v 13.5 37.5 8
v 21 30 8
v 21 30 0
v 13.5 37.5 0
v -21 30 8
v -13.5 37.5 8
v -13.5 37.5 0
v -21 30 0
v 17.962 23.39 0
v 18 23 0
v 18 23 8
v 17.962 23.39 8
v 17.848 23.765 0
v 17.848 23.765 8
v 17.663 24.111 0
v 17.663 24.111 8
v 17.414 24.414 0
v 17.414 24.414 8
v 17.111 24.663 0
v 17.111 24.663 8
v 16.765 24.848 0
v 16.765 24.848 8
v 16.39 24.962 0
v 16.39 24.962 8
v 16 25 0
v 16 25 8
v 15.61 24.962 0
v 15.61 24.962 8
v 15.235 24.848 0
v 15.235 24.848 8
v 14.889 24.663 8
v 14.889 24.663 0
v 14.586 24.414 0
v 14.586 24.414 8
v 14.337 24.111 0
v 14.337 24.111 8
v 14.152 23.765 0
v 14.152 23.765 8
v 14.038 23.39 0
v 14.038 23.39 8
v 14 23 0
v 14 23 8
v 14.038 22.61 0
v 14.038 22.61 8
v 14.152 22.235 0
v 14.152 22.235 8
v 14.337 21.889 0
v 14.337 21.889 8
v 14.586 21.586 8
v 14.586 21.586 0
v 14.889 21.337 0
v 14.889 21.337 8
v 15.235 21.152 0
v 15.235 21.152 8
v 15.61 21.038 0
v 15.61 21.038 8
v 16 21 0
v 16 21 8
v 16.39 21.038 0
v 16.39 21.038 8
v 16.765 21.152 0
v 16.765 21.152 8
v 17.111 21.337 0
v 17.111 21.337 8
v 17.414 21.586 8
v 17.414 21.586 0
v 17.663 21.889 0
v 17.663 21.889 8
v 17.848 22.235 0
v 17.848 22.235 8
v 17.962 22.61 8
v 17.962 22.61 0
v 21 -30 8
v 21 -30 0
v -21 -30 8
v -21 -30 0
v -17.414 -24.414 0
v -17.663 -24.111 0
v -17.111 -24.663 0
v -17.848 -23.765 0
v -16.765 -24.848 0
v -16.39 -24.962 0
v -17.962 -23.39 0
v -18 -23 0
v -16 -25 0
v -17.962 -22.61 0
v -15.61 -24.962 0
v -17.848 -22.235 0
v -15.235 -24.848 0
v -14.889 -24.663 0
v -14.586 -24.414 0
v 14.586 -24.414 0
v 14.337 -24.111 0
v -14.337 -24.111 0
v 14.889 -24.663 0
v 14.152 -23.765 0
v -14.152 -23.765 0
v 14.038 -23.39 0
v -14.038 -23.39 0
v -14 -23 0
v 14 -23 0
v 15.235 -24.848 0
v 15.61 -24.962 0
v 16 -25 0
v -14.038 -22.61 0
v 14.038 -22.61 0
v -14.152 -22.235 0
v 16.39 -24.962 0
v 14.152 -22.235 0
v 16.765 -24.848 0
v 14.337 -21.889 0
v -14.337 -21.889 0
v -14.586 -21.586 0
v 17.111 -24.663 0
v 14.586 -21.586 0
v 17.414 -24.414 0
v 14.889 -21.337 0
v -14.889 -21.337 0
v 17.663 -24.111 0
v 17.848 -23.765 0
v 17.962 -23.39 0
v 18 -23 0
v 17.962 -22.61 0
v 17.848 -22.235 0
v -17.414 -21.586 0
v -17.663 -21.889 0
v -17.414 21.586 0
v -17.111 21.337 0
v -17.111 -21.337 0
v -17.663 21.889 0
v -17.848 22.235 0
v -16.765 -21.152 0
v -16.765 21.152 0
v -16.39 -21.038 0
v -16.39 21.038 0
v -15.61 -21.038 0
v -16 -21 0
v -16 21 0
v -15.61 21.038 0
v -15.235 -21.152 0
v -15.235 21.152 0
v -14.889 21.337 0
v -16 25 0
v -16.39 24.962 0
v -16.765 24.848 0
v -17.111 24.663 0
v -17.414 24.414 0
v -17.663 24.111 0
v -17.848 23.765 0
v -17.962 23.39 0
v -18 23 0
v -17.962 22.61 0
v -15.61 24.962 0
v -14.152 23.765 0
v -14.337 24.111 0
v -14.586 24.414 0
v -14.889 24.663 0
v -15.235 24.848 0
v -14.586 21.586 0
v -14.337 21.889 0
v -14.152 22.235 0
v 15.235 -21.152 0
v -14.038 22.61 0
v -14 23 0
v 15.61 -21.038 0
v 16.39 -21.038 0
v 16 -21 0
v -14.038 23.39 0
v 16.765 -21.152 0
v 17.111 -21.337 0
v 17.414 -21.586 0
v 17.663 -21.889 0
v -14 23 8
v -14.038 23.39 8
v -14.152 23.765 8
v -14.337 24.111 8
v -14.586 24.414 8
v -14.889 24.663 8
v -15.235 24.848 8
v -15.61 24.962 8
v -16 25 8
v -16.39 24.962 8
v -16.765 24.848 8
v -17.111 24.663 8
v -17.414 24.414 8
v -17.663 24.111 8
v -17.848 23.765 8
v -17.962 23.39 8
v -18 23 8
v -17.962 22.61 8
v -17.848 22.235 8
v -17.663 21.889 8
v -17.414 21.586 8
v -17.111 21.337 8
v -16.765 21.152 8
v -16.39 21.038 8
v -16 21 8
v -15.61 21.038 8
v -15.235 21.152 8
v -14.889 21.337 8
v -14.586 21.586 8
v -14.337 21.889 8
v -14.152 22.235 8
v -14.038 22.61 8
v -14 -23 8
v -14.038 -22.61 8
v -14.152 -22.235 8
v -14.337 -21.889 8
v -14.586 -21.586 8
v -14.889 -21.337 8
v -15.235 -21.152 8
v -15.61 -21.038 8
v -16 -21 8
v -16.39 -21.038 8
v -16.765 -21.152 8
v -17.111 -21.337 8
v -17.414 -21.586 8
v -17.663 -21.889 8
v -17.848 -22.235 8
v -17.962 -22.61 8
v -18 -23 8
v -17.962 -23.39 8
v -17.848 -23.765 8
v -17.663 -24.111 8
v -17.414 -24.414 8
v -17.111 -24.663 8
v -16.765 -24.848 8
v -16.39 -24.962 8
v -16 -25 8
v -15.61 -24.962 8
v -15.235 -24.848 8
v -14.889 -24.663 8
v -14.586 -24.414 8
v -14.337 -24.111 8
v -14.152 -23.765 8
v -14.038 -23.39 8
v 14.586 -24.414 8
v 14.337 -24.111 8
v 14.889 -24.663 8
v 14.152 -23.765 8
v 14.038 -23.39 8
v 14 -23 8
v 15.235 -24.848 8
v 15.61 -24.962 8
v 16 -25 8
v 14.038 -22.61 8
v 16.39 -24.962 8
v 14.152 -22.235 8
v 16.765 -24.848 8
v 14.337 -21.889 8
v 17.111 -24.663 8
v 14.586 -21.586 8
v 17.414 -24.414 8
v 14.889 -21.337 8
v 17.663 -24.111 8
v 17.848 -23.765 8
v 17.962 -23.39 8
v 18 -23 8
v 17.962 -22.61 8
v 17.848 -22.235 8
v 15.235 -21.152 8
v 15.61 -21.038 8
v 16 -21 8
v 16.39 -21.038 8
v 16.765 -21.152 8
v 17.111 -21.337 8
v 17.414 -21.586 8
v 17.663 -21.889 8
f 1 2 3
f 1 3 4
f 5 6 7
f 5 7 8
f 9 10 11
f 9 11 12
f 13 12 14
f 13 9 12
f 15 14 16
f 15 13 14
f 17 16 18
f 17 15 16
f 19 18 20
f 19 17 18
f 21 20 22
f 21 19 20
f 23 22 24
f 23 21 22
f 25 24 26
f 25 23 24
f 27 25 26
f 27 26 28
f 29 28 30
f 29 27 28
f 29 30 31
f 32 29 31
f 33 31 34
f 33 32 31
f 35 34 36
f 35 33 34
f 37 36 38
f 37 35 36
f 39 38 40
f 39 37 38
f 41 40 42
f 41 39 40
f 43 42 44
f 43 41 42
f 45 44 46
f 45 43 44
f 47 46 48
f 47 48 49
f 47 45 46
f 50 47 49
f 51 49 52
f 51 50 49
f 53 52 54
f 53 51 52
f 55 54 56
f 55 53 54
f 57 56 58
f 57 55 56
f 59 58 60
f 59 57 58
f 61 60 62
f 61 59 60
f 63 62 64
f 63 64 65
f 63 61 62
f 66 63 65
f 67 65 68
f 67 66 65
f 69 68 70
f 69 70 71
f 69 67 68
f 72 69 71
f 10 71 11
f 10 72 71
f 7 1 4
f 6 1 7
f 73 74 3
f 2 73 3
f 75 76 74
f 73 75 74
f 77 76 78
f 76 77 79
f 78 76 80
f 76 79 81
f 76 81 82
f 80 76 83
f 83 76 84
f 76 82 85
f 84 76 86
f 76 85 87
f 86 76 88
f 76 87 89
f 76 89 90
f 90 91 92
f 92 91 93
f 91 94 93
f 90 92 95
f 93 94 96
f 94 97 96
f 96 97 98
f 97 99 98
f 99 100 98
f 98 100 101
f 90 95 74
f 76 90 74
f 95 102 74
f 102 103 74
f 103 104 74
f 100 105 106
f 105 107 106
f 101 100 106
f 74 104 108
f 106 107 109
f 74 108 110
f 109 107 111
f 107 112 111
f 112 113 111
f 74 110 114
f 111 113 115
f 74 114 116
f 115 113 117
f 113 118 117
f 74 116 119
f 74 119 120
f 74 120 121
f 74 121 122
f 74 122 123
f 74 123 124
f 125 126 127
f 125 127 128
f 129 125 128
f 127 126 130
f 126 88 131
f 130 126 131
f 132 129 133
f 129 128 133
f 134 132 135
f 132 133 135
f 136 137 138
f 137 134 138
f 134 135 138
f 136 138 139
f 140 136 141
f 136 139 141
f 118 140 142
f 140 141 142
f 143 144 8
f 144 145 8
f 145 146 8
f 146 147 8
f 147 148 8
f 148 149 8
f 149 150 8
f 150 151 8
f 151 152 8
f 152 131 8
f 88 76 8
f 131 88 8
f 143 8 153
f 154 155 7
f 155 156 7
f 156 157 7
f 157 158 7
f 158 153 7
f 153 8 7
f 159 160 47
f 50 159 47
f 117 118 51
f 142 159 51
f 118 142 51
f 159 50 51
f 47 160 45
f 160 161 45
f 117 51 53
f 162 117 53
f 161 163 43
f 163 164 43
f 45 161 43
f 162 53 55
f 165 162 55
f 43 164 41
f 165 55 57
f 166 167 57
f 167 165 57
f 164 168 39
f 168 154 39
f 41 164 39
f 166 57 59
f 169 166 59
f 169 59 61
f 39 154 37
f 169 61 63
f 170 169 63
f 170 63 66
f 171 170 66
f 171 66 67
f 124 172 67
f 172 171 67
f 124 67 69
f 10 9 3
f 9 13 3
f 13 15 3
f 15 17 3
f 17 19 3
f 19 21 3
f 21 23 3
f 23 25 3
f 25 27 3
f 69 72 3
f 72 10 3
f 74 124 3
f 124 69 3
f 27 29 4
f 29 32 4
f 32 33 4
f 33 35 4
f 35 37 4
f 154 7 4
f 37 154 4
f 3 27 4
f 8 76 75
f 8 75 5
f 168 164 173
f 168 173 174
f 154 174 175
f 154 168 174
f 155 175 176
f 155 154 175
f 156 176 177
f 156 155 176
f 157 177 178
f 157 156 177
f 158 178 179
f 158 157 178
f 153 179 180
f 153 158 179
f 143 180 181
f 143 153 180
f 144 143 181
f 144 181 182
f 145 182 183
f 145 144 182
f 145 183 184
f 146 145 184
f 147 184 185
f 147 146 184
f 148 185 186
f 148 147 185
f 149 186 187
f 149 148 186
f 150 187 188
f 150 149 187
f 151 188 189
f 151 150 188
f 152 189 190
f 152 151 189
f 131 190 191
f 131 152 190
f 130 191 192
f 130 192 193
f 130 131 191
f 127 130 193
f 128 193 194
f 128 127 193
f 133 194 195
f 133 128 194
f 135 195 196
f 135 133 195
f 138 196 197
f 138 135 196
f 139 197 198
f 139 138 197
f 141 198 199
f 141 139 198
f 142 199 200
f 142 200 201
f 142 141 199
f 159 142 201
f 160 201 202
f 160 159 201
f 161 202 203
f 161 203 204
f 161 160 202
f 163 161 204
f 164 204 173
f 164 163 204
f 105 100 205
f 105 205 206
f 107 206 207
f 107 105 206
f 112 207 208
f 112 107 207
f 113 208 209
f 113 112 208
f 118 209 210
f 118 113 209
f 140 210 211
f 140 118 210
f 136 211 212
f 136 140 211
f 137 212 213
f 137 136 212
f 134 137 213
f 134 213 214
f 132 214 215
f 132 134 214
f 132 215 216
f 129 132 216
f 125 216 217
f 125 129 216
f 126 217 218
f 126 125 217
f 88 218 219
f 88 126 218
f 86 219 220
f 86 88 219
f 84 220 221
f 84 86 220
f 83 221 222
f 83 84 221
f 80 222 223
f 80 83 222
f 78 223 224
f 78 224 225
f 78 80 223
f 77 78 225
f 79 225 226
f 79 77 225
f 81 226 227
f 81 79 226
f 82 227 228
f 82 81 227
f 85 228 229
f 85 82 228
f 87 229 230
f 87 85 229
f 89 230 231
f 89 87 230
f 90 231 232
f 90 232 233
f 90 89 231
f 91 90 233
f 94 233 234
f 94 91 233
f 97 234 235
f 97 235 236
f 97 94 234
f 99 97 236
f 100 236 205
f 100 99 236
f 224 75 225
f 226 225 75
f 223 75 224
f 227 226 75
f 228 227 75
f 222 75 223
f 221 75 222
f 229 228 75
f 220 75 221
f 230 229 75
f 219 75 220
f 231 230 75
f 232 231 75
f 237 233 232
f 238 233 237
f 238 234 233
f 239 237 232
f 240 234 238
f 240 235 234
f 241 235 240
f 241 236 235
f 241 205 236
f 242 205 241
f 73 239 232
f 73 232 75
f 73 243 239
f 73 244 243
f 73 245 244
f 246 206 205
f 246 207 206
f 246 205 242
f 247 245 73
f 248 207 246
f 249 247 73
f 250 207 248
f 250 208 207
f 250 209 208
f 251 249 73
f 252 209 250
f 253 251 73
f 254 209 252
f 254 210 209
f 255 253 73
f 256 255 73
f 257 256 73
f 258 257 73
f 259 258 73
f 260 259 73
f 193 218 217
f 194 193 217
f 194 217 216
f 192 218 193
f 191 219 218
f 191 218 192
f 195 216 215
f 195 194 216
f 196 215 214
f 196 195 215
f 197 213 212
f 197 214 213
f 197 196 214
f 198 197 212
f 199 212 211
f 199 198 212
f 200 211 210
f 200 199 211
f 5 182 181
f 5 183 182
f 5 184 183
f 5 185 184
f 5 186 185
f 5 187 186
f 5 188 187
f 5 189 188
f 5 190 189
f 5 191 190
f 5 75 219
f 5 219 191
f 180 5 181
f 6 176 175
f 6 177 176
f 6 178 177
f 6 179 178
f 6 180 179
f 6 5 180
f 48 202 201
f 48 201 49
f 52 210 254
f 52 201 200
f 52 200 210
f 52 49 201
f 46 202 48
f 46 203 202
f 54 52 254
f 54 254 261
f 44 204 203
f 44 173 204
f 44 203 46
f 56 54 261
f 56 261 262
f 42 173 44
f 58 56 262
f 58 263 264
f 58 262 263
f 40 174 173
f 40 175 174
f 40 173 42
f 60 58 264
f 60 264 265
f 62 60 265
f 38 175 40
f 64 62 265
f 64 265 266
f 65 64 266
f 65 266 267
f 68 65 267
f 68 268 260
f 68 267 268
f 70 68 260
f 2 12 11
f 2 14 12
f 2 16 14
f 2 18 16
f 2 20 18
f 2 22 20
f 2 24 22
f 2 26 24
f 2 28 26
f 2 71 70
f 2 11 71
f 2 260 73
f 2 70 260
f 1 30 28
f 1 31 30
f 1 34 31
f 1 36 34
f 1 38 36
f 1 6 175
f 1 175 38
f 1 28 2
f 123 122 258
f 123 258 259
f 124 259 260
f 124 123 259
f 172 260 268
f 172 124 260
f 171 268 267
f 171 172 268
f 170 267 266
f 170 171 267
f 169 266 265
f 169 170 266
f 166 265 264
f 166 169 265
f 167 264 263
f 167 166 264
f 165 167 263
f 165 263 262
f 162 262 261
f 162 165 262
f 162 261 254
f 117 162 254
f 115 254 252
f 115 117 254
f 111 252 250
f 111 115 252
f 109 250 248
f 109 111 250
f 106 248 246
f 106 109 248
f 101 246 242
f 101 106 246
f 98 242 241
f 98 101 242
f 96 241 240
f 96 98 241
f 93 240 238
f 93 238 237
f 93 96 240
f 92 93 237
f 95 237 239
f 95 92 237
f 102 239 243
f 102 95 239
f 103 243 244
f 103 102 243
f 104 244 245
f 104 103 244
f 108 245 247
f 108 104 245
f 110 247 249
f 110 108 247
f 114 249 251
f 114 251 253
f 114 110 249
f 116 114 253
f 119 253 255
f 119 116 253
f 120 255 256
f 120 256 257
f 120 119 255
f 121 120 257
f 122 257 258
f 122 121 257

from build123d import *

# Parameters (mm, degrees)
F0_W     = 42
F0_H     = 60
F0_R     = 2
F1_DEPTH = 8
F3_DEPTH = 8


with BuildPart() as f1:
    # F0 (on Top) → F1 (new body)
    with BuildSketch(Plane.XY):
        Rectangle(F0_W, F0_H)
        with Locations((-16, -23)):
            Circle(F0_R, mode=Mode.SUBTRACT)
        with Locations((16, -23)):
            Circle(F0_R, mode=Mode.SUBTRACT)
        with Locations((-16, 23)):
            Circle(F0_R, mode=Mode.SUBTRACT)
        with Locations((16, 23)):
            Circle(F0_R, mode=Mode.SUBTRACT)
    extrude(amount=F1_DEPTH)

    # F2 (on face) → F3 (join)
    with BuildSketch(Plane.XY.offset(8)):
        Polygon((-13.5, 37.5), (-21, 30), (21, 30), (13.5, 37.5), align=None)
    extrude(amount=-F3_DEPTH)


solid = f1.part
